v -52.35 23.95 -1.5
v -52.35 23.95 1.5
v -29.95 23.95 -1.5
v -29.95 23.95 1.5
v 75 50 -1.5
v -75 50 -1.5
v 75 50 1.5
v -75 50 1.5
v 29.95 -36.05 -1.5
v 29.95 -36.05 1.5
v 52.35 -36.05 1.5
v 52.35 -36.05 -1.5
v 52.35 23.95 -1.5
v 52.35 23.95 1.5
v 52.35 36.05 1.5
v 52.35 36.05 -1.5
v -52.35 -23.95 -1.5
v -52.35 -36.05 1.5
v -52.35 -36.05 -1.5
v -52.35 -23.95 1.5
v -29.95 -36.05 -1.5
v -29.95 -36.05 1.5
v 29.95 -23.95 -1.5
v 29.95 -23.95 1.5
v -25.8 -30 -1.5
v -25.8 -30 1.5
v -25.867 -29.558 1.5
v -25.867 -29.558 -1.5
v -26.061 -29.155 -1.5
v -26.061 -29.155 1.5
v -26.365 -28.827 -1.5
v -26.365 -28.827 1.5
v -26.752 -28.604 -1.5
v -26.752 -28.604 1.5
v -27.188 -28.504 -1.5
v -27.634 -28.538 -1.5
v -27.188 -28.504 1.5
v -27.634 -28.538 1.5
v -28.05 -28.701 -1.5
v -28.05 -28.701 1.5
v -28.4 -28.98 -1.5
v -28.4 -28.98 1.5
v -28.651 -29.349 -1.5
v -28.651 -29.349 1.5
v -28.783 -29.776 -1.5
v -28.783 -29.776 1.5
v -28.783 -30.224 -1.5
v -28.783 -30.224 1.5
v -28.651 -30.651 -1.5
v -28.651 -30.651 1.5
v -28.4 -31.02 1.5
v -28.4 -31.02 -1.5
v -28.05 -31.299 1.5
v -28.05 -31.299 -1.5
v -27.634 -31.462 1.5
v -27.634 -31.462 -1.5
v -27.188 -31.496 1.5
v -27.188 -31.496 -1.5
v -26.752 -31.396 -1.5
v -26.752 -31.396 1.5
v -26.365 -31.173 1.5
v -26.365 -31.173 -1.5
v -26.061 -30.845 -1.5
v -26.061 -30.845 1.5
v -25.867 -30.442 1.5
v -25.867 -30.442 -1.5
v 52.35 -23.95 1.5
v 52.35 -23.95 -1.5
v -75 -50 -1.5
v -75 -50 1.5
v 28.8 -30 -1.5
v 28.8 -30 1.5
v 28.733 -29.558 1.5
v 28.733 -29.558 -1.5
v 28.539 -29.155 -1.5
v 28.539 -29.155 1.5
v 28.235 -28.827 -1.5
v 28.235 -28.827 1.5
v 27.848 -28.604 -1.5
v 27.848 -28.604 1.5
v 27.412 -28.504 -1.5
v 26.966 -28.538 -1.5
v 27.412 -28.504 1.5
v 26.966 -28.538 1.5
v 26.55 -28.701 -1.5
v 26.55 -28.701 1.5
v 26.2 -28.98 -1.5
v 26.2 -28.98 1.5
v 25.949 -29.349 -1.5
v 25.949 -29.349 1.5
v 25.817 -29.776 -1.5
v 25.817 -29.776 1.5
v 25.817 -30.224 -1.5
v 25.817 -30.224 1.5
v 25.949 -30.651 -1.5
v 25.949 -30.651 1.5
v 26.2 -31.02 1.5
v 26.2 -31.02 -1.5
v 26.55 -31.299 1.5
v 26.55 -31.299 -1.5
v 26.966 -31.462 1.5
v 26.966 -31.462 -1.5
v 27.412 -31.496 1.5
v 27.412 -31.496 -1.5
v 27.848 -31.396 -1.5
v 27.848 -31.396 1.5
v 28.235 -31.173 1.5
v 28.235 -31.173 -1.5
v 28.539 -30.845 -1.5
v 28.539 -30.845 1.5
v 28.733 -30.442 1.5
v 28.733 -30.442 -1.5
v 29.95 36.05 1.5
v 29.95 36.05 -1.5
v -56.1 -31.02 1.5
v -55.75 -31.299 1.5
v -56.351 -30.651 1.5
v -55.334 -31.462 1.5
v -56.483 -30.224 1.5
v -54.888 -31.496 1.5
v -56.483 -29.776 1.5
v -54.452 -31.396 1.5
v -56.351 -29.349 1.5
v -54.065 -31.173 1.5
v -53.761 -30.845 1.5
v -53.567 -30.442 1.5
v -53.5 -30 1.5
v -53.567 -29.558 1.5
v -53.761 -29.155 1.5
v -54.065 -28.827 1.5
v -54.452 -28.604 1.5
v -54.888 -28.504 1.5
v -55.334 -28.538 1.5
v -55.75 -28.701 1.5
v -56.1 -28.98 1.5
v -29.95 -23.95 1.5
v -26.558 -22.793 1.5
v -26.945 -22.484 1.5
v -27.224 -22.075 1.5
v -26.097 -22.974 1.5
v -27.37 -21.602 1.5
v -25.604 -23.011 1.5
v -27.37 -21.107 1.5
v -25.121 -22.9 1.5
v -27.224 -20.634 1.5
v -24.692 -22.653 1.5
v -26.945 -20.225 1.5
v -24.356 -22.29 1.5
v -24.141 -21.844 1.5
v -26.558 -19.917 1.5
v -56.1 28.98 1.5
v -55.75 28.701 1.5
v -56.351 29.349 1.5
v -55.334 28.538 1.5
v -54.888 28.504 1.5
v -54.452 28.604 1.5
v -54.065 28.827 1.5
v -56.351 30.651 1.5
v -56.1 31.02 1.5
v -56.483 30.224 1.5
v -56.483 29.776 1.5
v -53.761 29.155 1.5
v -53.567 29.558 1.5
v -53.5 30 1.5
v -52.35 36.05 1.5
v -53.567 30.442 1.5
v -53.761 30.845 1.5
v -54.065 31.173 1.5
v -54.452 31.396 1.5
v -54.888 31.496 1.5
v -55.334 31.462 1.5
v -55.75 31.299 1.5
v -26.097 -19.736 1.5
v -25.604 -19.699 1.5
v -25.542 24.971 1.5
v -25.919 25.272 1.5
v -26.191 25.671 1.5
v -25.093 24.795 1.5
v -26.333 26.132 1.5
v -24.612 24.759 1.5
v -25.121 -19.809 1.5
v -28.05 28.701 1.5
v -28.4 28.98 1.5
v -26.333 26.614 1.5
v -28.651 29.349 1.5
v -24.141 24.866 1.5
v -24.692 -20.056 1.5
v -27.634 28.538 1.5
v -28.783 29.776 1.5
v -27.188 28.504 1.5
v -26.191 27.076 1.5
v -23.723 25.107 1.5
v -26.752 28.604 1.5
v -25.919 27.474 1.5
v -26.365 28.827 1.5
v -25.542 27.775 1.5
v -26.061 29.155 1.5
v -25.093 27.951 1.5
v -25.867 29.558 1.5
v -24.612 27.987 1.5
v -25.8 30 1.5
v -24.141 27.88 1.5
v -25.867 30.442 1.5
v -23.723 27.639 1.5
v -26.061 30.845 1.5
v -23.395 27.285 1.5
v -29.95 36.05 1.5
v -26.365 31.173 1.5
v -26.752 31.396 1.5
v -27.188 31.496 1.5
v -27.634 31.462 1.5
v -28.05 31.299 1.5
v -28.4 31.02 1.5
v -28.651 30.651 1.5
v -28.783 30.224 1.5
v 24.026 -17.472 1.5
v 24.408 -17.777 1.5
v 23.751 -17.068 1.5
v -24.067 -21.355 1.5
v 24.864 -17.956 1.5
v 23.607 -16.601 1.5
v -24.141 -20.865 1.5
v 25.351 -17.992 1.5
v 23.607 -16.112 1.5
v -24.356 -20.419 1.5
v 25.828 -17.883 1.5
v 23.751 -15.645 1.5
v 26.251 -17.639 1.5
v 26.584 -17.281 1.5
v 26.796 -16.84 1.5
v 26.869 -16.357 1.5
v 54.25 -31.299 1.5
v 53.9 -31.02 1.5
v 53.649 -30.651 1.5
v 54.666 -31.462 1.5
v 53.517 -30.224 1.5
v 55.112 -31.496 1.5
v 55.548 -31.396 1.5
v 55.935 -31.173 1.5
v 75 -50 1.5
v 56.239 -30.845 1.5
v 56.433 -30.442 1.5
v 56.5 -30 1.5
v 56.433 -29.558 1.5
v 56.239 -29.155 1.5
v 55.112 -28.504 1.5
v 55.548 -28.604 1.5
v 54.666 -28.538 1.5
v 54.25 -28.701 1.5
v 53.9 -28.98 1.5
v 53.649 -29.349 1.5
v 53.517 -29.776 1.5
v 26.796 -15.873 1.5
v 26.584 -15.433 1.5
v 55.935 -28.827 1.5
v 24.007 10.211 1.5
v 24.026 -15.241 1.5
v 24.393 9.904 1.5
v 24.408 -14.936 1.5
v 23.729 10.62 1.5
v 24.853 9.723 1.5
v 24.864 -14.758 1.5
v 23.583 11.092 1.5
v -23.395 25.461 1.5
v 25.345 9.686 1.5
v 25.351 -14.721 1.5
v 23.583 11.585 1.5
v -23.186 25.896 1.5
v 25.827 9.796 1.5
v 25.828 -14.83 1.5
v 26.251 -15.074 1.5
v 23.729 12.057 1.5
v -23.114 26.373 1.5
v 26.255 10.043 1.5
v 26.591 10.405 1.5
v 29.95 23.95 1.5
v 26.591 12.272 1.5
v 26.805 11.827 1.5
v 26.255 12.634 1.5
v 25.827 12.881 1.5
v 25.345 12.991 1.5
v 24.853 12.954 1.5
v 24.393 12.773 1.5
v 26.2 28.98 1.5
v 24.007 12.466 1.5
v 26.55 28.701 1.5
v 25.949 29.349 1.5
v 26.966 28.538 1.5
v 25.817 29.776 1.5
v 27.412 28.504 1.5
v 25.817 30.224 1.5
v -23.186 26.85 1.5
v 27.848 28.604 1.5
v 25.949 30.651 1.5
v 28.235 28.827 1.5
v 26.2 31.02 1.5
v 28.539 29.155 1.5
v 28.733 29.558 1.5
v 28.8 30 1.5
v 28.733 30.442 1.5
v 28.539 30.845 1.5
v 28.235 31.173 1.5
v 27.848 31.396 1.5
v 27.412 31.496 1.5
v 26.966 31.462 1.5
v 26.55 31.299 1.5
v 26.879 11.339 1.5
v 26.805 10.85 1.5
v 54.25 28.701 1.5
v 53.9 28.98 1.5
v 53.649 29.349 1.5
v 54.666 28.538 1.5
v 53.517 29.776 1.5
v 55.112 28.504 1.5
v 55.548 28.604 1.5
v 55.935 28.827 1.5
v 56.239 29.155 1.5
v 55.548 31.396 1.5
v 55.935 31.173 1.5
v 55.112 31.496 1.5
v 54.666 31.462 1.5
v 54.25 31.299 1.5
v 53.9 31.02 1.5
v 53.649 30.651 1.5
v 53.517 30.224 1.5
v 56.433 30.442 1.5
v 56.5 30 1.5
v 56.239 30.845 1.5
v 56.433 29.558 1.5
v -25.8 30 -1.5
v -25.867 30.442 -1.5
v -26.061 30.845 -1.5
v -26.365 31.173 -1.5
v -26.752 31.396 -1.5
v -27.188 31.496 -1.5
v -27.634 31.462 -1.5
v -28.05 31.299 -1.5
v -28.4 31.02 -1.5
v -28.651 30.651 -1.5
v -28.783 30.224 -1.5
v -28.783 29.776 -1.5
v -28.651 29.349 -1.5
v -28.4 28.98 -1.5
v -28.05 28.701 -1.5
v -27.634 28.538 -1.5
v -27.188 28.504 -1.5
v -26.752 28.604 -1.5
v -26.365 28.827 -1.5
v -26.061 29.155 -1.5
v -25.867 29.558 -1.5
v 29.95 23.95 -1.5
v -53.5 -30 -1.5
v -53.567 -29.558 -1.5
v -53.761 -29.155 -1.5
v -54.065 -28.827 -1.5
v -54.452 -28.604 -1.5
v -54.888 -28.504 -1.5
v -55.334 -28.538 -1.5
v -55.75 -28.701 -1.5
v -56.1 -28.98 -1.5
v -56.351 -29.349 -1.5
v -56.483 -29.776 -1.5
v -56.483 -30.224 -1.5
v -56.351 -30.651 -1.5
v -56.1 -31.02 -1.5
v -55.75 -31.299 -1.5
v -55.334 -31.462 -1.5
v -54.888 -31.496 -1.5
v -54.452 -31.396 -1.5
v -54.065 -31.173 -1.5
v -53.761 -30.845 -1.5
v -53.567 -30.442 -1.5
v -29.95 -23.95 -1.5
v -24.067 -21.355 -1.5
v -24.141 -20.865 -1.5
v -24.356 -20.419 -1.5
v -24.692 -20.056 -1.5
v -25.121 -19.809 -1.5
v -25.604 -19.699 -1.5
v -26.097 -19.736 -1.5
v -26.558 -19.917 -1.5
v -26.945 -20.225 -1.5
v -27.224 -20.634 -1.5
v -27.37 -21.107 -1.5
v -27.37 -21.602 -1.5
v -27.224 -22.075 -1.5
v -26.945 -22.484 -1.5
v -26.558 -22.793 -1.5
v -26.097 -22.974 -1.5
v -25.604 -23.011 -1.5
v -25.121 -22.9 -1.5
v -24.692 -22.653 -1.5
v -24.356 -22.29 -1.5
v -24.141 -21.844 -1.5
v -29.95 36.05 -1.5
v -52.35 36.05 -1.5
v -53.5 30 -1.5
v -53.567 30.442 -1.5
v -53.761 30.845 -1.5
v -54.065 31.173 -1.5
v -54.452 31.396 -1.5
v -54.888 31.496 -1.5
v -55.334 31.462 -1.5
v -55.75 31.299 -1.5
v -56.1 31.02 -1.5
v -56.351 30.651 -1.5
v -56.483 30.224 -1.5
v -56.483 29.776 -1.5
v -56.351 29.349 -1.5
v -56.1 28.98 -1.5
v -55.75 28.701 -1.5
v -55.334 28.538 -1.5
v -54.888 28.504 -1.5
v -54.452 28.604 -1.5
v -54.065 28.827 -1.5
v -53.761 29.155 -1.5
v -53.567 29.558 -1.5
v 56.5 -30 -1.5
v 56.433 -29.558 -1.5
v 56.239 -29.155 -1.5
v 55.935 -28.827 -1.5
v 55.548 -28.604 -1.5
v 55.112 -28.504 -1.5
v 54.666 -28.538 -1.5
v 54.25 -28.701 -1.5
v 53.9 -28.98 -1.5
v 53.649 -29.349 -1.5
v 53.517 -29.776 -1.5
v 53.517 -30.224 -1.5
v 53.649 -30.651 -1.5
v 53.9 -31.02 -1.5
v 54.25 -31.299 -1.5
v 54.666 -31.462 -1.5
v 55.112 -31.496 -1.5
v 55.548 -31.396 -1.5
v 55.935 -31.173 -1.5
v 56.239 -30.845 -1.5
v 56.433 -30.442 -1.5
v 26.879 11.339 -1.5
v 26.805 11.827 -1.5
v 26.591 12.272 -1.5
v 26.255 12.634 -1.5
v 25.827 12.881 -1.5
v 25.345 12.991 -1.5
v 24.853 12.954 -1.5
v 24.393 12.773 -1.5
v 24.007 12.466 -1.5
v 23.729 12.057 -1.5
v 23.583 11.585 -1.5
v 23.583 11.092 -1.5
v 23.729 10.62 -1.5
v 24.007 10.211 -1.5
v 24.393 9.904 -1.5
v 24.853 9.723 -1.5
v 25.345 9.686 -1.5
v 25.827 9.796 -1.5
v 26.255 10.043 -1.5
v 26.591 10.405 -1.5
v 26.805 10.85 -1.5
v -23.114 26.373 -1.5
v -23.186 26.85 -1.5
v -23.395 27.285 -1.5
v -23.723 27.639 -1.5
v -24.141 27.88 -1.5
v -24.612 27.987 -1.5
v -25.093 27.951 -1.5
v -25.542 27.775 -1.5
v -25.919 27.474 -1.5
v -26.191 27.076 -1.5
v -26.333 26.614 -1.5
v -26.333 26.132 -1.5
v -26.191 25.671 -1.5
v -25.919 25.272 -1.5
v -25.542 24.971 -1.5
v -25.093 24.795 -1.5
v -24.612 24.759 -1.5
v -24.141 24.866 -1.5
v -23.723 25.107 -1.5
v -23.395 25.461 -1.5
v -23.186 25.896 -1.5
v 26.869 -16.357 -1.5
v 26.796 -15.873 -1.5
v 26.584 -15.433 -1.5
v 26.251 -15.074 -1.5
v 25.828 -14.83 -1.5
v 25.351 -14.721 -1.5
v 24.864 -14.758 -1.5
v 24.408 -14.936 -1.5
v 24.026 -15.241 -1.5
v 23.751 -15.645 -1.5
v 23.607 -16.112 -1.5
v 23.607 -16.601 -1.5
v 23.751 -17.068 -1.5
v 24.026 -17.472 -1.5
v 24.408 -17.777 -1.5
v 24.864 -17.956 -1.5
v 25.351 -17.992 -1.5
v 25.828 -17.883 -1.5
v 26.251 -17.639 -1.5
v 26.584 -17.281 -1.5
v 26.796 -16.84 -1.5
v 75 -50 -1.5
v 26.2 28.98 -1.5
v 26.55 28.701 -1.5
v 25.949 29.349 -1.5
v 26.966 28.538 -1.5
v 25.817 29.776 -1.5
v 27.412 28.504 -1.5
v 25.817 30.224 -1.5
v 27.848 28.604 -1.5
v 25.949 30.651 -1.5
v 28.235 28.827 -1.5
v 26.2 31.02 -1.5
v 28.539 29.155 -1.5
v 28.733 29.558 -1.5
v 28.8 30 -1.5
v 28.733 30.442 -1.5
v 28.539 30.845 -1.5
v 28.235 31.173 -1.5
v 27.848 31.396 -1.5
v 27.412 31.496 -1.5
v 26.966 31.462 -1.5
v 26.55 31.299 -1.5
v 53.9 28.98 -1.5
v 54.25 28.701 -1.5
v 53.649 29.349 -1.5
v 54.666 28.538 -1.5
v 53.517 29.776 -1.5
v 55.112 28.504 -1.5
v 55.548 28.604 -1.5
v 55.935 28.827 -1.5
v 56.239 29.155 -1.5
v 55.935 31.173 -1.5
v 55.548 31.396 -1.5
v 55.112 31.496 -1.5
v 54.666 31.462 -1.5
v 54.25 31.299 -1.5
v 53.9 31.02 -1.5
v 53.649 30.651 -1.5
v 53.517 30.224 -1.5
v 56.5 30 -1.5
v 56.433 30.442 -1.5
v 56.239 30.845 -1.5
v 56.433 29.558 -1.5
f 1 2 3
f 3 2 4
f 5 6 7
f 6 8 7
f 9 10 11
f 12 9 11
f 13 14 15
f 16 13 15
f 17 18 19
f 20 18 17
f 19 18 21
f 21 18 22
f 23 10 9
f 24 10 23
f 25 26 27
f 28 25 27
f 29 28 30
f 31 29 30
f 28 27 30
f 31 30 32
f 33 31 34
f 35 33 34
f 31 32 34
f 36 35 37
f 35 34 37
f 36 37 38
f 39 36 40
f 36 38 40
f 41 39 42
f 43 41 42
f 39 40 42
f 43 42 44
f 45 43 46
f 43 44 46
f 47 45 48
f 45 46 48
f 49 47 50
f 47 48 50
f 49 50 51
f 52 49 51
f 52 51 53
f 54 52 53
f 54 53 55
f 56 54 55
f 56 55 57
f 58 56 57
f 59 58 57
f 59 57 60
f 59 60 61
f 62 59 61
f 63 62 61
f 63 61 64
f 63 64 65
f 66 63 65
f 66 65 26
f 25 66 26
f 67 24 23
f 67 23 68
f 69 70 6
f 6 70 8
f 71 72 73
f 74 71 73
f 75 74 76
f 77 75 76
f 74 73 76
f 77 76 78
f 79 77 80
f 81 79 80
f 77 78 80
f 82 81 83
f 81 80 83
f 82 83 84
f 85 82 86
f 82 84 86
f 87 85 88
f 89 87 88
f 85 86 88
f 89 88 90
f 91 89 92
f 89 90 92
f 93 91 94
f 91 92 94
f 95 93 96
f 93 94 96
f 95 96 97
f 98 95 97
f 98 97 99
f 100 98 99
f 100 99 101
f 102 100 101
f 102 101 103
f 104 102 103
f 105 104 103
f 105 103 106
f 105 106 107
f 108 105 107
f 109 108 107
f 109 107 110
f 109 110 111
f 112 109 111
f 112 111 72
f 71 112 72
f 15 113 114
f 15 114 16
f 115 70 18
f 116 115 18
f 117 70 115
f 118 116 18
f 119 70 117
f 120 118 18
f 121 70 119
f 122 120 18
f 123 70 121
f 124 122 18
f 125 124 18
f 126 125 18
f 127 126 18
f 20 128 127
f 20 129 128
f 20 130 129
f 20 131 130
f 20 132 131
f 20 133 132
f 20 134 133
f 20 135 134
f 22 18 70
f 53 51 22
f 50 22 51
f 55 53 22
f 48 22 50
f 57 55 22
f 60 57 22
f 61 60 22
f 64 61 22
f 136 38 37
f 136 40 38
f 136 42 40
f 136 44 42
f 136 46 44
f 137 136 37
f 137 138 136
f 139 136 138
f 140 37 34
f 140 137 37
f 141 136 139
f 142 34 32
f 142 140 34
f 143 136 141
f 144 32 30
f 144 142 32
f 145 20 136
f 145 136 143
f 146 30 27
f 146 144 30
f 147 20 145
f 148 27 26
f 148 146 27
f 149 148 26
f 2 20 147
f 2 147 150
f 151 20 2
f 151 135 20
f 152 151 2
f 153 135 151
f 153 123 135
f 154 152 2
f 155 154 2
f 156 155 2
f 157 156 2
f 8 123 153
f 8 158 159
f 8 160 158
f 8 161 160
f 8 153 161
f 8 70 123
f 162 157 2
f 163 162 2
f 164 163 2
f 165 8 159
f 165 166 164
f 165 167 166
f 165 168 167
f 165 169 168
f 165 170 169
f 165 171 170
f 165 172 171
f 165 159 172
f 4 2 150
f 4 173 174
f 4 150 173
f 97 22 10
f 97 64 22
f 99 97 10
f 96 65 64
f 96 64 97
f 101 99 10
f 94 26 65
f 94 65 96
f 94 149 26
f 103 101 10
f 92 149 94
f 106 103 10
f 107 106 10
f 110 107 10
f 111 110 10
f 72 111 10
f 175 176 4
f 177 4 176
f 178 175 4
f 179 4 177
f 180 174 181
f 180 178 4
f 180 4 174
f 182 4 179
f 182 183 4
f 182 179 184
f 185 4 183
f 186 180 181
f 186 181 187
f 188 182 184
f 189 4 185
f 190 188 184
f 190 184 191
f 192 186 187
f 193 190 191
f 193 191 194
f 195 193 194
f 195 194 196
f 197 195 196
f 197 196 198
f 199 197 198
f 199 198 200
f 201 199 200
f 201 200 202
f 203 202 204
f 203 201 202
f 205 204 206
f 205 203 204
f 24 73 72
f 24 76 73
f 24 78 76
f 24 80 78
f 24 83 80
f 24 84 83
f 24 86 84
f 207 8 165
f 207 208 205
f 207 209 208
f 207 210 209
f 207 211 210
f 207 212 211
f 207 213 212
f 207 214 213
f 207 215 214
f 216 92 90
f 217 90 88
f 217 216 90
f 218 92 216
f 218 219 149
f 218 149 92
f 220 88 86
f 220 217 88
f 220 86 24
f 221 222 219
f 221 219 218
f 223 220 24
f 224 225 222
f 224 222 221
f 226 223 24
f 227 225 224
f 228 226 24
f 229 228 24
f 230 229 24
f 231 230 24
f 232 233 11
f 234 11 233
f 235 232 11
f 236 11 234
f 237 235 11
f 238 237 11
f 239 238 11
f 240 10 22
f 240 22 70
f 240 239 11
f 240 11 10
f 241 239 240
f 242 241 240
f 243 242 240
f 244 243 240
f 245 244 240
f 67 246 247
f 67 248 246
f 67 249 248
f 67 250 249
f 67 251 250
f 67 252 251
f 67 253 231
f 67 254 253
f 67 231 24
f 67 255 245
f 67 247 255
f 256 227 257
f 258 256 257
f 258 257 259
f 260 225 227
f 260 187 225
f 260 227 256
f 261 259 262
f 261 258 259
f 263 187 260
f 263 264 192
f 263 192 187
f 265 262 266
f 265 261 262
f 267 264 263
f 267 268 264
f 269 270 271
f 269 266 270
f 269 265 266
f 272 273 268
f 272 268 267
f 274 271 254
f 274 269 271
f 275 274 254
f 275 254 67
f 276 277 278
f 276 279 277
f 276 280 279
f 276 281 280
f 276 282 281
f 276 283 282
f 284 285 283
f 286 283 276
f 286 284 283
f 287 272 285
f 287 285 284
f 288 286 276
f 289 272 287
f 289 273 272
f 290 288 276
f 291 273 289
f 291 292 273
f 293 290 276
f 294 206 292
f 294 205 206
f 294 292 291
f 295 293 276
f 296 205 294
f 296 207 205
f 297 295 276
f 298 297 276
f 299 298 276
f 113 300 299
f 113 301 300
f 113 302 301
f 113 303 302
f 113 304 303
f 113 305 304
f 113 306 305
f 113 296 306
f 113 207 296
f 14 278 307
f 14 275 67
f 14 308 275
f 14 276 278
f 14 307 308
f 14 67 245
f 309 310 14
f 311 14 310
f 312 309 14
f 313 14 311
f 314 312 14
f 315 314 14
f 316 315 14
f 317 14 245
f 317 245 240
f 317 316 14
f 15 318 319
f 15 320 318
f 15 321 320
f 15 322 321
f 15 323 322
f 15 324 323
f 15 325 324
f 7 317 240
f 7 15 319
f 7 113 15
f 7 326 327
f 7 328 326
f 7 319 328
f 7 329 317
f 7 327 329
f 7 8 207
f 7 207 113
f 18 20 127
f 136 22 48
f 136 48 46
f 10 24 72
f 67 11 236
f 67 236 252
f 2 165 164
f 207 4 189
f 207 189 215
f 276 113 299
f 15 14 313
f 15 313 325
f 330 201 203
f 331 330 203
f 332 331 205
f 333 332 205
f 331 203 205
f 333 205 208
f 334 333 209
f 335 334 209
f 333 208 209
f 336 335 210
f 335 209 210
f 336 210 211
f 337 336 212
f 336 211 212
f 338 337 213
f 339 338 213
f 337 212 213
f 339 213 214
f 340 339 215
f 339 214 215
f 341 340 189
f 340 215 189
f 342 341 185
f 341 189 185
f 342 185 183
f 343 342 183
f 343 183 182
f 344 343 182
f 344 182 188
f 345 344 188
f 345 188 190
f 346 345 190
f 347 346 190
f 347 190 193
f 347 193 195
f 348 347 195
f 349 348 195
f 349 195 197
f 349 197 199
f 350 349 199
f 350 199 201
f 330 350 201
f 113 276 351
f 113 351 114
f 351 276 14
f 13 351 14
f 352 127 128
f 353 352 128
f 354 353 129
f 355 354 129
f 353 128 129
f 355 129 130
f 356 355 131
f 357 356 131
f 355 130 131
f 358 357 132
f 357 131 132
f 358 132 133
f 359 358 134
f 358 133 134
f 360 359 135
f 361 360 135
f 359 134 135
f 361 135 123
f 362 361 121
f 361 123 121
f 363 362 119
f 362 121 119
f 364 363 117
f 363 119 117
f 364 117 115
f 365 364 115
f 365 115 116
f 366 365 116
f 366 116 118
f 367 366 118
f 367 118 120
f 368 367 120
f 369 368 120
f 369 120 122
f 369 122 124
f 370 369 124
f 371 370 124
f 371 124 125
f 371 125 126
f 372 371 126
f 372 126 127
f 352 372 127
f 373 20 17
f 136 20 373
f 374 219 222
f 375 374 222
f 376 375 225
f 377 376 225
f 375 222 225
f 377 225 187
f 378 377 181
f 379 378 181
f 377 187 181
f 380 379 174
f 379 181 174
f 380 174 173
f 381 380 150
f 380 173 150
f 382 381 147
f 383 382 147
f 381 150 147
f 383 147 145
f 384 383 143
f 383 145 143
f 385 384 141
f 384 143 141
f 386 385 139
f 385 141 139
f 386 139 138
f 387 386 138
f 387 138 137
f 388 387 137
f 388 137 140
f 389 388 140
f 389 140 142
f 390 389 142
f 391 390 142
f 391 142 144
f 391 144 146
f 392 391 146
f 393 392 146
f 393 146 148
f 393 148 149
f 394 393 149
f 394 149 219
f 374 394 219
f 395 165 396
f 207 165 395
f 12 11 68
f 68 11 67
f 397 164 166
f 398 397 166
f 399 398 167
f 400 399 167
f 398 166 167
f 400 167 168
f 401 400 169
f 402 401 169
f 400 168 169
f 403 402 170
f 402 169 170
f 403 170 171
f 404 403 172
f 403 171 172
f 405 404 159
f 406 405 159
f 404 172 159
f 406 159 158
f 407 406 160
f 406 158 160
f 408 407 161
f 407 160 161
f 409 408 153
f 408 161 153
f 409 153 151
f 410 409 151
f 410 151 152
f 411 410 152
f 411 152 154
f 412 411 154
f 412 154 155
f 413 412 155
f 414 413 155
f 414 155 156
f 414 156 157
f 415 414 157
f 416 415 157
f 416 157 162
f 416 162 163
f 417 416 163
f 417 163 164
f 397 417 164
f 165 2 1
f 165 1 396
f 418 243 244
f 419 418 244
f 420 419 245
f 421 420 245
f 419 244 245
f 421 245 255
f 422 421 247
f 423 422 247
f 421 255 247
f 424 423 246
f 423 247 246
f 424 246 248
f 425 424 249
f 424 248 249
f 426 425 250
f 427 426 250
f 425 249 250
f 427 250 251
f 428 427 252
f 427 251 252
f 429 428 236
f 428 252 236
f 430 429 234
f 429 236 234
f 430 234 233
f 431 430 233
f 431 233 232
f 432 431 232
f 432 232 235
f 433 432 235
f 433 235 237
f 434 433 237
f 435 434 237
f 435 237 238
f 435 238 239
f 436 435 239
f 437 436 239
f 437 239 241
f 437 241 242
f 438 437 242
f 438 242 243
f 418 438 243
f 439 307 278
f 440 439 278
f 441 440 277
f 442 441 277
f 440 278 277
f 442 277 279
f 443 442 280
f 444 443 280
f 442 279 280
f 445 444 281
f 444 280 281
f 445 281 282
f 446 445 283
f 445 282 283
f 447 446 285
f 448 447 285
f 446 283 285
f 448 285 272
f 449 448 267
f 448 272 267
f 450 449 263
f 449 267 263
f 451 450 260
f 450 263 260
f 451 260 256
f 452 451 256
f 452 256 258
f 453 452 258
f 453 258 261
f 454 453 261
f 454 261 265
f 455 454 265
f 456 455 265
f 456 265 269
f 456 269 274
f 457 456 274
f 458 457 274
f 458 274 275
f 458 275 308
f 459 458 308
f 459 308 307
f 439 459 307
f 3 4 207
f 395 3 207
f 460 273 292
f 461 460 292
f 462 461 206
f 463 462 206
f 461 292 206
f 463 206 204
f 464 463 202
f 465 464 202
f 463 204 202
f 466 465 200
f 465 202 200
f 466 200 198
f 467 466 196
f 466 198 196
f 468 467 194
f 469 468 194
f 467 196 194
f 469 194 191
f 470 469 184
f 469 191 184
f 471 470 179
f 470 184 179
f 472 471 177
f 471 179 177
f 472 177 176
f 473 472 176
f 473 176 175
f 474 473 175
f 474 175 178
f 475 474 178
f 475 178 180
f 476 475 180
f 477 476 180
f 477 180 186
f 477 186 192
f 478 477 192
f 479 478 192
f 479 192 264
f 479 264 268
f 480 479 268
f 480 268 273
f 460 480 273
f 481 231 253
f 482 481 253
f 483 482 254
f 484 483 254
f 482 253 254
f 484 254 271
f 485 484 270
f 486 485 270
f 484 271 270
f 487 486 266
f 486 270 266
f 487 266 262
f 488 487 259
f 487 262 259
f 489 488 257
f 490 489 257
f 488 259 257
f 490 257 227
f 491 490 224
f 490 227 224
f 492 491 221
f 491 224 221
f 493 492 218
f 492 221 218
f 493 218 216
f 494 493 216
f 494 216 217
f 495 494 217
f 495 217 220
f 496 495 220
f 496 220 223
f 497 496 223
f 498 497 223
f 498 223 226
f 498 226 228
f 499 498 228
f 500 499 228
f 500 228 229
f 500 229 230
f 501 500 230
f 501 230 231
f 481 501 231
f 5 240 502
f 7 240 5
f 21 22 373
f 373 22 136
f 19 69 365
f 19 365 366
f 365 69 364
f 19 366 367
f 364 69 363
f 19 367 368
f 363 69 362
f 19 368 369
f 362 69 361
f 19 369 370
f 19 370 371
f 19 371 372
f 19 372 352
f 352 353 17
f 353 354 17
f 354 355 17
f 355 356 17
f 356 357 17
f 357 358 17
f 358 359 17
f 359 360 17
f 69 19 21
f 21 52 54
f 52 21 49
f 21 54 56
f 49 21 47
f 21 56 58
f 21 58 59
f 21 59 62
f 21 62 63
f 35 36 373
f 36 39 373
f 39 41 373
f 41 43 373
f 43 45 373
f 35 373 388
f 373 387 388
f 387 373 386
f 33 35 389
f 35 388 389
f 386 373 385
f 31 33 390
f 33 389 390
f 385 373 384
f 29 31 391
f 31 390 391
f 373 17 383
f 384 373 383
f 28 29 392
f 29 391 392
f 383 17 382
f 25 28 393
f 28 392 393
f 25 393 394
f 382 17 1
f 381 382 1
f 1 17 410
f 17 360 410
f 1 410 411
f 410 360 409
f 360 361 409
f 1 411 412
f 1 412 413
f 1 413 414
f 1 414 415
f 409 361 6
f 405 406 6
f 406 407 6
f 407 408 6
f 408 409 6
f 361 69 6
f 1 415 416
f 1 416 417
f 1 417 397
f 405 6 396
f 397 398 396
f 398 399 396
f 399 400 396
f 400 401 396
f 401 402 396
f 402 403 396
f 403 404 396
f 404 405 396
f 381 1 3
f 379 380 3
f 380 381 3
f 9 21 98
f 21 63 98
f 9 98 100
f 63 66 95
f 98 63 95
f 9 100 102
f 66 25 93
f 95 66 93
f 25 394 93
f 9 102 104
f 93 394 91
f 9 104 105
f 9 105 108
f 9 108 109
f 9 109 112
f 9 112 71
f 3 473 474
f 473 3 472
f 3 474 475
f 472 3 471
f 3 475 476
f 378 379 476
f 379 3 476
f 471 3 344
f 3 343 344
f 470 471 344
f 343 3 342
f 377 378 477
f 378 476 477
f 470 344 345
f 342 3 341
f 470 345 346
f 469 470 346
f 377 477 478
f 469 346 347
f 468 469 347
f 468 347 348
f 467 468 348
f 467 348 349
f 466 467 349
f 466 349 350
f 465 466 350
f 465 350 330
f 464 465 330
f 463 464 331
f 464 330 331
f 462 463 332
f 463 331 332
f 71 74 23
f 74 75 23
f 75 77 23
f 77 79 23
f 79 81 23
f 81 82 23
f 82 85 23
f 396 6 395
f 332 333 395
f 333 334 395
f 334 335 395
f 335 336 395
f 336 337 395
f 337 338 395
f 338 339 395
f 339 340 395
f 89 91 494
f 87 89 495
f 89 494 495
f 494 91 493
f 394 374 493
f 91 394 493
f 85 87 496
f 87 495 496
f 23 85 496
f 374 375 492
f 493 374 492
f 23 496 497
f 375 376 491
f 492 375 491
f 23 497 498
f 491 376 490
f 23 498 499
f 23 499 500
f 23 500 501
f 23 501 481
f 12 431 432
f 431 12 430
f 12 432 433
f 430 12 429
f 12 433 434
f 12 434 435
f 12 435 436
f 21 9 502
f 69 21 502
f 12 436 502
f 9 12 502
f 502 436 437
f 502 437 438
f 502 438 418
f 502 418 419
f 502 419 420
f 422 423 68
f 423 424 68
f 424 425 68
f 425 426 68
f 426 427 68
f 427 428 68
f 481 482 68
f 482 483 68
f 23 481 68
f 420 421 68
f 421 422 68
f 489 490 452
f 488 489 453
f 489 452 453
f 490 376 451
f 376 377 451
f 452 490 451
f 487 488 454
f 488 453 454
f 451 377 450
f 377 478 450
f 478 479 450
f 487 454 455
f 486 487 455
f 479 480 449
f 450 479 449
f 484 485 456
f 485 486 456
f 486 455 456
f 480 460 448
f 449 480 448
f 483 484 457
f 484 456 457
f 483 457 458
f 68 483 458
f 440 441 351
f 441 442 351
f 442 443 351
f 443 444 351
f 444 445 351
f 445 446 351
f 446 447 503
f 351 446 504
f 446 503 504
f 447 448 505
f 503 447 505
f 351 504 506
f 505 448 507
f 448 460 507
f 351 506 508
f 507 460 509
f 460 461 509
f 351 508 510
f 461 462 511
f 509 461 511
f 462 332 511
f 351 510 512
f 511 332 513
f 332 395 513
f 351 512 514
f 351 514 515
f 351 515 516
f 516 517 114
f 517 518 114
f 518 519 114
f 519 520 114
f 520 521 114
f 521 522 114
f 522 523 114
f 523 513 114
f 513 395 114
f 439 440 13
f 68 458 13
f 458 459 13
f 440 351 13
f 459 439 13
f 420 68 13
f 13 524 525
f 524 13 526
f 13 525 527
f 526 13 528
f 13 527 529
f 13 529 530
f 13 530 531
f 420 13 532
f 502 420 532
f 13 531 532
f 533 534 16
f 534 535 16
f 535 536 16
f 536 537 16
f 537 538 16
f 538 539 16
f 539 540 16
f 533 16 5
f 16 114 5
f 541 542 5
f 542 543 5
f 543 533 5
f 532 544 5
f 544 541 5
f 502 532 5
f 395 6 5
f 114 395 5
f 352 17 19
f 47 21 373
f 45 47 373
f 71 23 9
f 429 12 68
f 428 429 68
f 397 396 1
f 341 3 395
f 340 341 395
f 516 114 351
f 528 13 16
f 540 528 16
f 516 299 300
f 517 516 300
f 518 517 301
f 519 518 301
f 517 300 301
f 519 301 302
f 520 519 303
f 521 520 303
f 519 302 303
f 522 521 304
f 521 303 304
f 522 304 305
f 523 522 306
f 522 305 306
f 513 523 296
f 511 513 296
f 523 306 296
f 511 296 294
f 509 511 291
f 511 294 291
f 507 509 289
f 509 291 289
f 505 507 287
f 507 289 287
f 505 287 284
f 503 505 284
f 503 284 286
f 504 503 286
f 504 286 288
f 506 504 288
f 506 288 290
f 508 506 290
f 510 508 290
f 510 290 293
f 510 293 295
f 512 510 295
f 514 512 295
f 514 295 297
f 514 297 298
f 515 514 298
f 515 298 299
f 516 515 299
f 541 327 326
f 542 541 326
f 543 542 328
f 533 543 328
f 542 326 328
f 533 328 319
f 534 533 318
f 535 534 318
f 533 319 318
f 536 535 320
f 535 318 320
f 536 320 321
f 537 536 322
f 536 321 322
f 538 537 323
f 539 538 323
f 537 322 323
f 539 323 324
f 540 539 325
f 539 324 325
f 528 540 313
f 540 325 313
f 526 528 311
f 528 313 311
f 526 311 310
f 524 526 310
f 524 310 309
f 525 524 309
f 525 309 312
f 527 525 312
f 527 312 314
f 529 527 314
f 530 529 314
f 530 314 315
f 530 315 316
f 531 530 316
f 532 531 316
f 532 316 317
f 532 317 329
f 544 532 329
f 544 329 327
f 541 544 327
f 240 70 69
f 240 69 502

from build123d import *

# Parameters (mm, degrees)
F0_W     = 150
F0_H     = 100
F1_DEPTH = 1.5
F2_R     = 1.5
F2_W     = 22.4
F2_H     = 12.1
F3_DEPTH = 3.001
F4_R     = 1.618849898
F4_R_2   = 1.6569654359
F4_R_3   = 1.6400542831
F4_R_4   = 1.6604885459
F5_DEPTH = 3.001


with BuildPart() as f1:
    # F0 (on Top) → F1 (new body, symmetric)
    with BuildSketch(Plane.XY):
        Rectangle(F0_W, F0_H)
    extrude(amount=F1_DEPTH, both=True)

    # F2 (on face) → F3 (cut, through all)
    with BuildSketch(Plane.XY.offset(1.5)):
        with Locations((-55, -30)):
            Circle(F2_R)
        with Locations((-27.3, -30)):
            Circle(F2_R)
        with Locations((-41.15, -30)):
            Rectangle(F2_W, F2_H)
        with Locations((27.3, -30)):
            Circle(F2_R)
        with Locations((55, -30)):
            Circle(F2_R)
        with Locations((41.15, -30)):
            Rectangle(F2_W, F2_H)
        with Locations((27.3, 30)):
            Circle(F2_R)
        with Locations((55, 30)):
            Circle(F2_R)
        with Locations((41.15, 30)):
            Rectangle(F2_W, F2_H)
        with Locations((-55, 30)):
            Circle(F2_R)
        with Locations((-27.3, 30)):
            Circle(F2_R)
        with Locations((-41.15, 30)):
            Rectangle(F2_W, F2_H)
    extrude(amount=-F3_DEPTH, mode=Mode.SUBTRACT)

    # F4 (on face) → F5 (cut, through all)
    with BuildSketch(Plane.XY.offset(1.5)):
        with Locations((-24.7324935626, 26.3731424032)):
            Circle(F4_R)
        with Locations((25.2215412911, 11.3385100679)):
            Circle(F4_R_2)
        with Locations((25.2285262104, -16.3567047299)):
            Circle(F4_R_3)
        with Locations((-25.7276298944, -21.3546585025)):
            Circle(F4_R_4)
    extrude(amount=-F5_DEPTH, mode=Mode.SUBTRACT)


solid = f1.part
